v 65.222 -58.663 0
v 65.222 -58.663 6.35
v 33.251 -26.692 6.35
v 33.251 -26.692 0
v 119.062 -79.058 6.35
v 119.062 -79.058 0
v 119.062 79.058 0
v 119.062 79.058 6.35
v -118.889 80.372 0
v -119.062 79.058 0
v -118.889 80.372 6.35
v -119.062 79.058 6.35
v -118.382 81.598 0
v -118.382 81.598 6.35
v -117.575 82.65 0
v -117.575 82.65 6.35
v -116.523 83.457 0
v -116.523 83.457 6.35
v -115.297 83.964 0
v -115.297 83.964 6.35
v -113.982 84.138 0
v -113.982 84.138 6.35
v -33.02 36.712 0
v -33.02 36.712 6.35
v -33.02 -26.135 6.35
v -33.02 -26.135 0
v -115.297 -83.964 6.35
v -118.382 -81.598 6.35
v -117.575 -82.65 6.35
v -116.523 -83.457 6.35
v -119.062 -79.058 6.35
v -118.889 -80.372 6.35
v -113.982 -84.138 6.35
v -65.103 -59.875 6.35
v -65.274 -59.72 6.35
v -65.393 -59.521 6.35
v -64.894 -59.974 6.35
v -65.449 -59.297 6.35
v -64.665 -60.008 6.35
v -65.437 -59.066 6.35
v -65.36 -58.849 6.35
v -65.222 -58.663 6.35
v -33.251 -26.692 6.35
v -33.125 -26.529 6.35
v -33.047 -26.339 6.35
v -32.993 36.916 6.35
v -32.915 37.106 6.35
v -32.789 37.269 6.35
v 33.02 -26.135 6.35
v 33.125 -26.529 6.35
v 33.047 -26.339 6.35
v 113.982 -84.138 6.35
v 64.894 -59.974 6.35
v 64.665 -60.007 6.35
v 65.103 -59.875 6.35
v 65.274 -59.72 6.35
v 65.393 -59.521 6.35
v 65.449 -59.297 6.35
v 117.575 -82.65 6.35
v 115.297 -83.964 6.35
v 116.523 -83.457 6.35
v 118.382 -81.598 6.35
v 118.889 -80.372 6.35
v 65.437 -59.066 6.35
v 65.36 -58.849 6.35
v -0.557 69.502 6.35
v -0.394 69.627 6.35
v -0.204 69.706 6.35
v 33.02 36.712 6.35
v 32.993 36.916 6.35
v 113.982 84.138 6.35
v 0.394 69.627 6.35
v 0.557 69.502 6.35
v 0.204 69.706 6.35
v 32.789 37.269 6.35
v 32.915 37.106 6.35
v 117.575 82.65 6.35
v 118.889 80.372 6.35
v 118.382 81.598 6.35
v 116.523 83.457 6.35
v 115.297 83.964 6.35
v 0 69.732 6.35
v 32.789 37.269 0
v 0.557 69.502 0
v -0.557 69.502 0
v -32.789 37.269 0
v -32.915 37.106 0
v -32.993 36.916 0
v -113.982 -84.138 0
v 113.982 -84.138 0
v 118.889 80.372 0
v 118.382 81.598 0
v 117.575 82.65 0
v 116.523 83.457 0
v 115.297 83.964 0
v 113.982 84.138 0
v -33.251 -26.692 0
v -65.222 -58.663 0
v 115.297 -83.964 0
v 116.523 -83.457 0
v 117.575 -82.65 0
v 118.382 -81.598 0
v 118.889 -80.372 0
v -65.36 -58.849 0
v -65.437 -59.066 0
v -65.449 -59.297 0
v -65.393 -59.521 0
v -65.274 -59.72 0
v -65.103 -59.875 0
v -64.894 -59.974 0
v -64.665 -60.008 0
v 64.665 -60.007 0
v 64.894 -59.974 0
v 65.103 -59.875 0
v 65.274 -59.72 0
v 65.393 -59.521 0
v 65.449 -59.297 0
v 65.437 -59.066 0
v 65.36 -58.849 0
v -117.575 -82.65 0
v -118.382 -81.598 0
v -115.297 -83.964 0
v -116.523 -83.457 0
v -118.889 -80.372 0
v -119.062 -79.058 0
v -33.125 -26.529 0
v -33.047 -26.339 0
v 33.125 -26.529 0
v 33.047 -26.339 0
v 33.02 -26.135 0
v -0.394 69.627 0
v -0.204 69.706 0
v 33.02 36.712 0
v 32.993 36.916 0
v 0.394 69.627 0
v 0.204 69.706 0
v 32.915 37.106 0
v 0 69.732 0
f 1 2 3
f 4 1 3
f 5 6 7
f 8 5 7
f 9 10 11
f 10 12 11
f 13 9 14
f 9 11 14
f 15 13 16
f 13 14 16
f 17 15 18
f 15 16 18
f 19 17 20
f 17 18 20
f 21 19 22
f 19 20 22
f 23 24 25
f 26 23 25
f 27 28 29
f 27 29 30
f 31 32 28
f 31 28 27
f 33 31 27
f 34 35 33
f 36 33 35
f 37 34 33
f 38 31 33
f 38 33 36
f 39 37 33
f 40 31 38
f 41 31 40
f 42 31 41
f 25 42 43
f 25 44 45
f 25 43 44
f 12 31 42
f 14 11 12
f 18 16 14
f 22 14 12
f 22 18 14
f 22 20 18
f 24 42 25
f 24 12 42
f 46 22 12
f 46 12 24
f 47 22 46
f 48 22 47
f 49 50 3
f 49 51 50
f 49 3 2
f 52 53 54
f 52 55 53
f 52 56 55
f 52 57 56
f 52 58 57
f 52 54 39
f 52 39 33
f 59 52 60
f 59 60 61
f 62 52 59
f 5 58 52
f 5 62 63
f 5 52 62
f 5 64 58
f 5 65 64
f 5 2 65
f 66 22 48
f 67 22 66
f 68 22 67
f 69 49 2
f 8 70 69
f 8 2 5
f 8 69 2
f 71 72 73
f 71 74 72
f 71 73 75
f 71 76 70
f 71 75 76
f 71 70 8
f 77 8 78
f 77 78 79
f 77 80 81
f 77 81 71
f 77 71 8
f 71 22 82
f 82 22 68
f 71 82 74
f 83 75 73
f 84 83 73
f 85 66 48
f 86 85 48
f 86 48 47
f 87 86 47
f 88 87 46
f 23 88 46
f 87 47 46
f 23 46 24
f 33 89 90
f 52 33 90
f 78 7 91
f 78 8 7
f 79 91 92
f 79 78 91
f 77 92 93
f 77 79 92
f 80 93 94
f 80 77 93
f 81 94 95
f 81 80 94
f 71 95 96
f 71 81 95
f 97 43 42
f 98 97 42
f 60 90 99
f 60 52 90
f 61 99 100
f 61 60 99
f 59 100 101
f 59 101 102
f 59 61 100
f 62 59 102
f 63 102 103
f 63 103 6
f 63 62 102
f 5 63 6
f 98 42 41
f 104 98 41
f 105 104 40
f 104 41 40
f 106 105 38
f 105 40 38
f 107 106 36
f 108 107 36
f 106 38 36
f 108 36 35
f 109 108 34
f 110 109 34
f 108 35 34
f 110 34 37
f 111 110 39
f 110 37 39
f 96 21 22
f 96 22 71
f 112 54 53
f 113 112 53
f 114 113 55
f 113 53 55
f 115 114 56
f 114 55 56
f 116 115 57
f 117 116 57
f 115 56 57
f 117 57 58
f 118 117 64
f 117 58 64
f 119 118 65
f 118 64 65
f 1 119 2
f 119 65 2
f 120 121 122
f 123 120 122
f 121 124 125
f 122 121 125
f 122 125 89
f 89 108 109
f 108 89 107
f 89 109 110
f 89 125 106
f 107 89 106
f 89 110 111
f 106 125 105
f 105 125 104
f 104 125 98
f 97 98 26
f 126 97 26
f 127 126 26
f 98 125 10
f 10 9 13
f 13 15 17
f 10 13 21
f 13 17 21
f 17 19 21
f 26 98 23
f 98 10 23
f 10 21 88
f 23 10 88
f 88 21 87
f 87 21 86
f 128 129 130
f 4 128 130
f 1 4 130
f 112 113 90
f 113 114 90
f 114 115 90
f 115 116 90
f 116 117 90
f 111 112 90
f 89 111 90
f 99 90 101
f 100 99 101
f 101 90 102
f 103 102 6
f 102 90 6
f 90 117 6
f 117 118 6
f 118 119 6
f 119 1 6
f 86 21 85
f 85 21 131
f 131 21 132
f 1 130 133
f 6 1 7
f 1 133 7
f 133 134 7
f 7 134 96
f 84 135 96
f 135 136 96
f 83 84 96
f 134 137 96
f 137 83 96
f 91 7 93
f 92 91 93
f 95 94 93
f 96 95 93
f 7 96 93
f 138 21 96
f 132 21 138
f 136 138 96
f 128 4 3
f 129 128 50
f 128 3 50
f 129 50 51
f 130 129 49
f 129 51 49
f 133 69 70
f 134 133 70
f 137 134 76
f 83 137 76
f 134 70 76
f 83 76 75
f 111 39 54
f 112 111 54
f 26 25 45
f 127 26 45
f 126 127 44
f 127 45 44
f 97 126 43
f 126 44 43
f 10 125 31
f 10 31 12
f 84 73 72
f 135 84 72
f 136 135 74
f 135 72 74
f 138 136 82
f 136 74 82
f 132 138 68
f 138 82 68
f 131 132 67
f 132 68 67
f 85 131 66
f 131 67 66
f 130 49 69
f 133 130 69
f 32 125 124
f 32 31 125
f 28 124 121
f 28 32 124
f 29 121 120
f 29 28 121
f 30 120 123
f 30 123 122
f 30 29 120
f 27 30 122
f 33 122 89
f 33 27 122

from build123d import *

# Parameters (mm, degrees)
F0_W     = 238.125
F0_H     = 168.275
F1_DEPTH = 6.35
F2_R     = 5.08
F4_DEPTH = 25.4
F5_DEPTH = 6.351
F7_DEPTH = 6.351


with BuildPart() as f1:
    # F0 (on Top) → F1 (new body)
    with BuildSketch(Plane.XY):
        Rectangle(F0_W, F0_H)
    extrude(amount=F1_DEPTH)

    # F2
    f2_edges = [f1.edges().sort_by_distance(p)[0] for p in [
        (-119.0625, 84.1375, 3.175),
        (119.0625, 84.1375, 3.175),
        (-119.0625, -84.1375, 3.175),
        (119.0625, -84.1375, 3.175),
    ]]
    fillet(f2_edges, radius=F2_R)

    # F3 (on face) → F4 (cut)
    with BuildSketch(Plane.XY.offset(6.35)):
        Polygon((-63.5, -58.7375), (0, -58.7375), (63.5, -58.7375), (31.75, -26.9875), (31.75, 36.5125), (0, 68.2625), (-31.75, 36.5125), (-31.75, -26.9875), align=None)
    extrude(amount=-F4_DEPTH, mode=Mode.SUBTRACT)

    # F3 (on face) → F5 (cut, through all)
    with BuildSketch(Plane.XY.offset(6.35)):
        Polygon((-63.5, -58.7375), (0, -58.7375), (63.5, -58.7375), (31.75, -26.9875), (31.75, 36.5125), (0, 68.2625), (-31.75, 36.5125), (-31.75, -26.9875), align=None)
    extrude(amount=-F5_DEPTH, mode=Mode.SUBTRACT)

    # F6 (on face) → F7 (cut, through all)
    with BuildSketch(Plane.XY.offset(6.35)):
        with BuildLine():
            Line((-33.02, 36.712399), (-33.02, -26.135297))
            ThreePointArc((-33.02, -26.135297), (-33.079937, -26.436622), (-33.250624, -26.692073))
            Line((-33.250624, -26.692073), (-65.221875, -58.663324))
            ThreePointArc((-65.221875, -58.663324), (-65.392562, -59.521425), (-64.665099, -60.0075))
            Line((-64.665099, -60.0075), (64.665099, -60.0075))
            ThreePointArc((64.665099, -60.0075), (65.392562, -59.521425), (65.221875, -58.663324))
            Line((65.221875, -58.663324), (33.250624, -26.692073))
            ThreePointArc((33.250624, -26.692073), (33.079937, -26.436622), (33.02, -26.135297))
            Line((33.02, -26.135297), (33.02, 36.712399))
            ThreePointArc((33.02, 36.712399), (32.960063, 37.013724), (32.789376, 37.269175))
            Line((32.789376, 37.269175), (0.556776, 69.501775))
            ThreePointArc((0.556776, 69.501775), (0, 69.732399), (-0.556776, 69.501775))
            Line((-0.556776, 69.501775), (-32.789376, 37.269175))
            ThreePointArc((-32.789376, 37.269175), (-32.960063, 37.013724), (-33.02, 36.712399))
        make_face()
    extrude(amount=-F7_DEPTH, mode=Mode.SUBTRACT)


solid = f1.part
